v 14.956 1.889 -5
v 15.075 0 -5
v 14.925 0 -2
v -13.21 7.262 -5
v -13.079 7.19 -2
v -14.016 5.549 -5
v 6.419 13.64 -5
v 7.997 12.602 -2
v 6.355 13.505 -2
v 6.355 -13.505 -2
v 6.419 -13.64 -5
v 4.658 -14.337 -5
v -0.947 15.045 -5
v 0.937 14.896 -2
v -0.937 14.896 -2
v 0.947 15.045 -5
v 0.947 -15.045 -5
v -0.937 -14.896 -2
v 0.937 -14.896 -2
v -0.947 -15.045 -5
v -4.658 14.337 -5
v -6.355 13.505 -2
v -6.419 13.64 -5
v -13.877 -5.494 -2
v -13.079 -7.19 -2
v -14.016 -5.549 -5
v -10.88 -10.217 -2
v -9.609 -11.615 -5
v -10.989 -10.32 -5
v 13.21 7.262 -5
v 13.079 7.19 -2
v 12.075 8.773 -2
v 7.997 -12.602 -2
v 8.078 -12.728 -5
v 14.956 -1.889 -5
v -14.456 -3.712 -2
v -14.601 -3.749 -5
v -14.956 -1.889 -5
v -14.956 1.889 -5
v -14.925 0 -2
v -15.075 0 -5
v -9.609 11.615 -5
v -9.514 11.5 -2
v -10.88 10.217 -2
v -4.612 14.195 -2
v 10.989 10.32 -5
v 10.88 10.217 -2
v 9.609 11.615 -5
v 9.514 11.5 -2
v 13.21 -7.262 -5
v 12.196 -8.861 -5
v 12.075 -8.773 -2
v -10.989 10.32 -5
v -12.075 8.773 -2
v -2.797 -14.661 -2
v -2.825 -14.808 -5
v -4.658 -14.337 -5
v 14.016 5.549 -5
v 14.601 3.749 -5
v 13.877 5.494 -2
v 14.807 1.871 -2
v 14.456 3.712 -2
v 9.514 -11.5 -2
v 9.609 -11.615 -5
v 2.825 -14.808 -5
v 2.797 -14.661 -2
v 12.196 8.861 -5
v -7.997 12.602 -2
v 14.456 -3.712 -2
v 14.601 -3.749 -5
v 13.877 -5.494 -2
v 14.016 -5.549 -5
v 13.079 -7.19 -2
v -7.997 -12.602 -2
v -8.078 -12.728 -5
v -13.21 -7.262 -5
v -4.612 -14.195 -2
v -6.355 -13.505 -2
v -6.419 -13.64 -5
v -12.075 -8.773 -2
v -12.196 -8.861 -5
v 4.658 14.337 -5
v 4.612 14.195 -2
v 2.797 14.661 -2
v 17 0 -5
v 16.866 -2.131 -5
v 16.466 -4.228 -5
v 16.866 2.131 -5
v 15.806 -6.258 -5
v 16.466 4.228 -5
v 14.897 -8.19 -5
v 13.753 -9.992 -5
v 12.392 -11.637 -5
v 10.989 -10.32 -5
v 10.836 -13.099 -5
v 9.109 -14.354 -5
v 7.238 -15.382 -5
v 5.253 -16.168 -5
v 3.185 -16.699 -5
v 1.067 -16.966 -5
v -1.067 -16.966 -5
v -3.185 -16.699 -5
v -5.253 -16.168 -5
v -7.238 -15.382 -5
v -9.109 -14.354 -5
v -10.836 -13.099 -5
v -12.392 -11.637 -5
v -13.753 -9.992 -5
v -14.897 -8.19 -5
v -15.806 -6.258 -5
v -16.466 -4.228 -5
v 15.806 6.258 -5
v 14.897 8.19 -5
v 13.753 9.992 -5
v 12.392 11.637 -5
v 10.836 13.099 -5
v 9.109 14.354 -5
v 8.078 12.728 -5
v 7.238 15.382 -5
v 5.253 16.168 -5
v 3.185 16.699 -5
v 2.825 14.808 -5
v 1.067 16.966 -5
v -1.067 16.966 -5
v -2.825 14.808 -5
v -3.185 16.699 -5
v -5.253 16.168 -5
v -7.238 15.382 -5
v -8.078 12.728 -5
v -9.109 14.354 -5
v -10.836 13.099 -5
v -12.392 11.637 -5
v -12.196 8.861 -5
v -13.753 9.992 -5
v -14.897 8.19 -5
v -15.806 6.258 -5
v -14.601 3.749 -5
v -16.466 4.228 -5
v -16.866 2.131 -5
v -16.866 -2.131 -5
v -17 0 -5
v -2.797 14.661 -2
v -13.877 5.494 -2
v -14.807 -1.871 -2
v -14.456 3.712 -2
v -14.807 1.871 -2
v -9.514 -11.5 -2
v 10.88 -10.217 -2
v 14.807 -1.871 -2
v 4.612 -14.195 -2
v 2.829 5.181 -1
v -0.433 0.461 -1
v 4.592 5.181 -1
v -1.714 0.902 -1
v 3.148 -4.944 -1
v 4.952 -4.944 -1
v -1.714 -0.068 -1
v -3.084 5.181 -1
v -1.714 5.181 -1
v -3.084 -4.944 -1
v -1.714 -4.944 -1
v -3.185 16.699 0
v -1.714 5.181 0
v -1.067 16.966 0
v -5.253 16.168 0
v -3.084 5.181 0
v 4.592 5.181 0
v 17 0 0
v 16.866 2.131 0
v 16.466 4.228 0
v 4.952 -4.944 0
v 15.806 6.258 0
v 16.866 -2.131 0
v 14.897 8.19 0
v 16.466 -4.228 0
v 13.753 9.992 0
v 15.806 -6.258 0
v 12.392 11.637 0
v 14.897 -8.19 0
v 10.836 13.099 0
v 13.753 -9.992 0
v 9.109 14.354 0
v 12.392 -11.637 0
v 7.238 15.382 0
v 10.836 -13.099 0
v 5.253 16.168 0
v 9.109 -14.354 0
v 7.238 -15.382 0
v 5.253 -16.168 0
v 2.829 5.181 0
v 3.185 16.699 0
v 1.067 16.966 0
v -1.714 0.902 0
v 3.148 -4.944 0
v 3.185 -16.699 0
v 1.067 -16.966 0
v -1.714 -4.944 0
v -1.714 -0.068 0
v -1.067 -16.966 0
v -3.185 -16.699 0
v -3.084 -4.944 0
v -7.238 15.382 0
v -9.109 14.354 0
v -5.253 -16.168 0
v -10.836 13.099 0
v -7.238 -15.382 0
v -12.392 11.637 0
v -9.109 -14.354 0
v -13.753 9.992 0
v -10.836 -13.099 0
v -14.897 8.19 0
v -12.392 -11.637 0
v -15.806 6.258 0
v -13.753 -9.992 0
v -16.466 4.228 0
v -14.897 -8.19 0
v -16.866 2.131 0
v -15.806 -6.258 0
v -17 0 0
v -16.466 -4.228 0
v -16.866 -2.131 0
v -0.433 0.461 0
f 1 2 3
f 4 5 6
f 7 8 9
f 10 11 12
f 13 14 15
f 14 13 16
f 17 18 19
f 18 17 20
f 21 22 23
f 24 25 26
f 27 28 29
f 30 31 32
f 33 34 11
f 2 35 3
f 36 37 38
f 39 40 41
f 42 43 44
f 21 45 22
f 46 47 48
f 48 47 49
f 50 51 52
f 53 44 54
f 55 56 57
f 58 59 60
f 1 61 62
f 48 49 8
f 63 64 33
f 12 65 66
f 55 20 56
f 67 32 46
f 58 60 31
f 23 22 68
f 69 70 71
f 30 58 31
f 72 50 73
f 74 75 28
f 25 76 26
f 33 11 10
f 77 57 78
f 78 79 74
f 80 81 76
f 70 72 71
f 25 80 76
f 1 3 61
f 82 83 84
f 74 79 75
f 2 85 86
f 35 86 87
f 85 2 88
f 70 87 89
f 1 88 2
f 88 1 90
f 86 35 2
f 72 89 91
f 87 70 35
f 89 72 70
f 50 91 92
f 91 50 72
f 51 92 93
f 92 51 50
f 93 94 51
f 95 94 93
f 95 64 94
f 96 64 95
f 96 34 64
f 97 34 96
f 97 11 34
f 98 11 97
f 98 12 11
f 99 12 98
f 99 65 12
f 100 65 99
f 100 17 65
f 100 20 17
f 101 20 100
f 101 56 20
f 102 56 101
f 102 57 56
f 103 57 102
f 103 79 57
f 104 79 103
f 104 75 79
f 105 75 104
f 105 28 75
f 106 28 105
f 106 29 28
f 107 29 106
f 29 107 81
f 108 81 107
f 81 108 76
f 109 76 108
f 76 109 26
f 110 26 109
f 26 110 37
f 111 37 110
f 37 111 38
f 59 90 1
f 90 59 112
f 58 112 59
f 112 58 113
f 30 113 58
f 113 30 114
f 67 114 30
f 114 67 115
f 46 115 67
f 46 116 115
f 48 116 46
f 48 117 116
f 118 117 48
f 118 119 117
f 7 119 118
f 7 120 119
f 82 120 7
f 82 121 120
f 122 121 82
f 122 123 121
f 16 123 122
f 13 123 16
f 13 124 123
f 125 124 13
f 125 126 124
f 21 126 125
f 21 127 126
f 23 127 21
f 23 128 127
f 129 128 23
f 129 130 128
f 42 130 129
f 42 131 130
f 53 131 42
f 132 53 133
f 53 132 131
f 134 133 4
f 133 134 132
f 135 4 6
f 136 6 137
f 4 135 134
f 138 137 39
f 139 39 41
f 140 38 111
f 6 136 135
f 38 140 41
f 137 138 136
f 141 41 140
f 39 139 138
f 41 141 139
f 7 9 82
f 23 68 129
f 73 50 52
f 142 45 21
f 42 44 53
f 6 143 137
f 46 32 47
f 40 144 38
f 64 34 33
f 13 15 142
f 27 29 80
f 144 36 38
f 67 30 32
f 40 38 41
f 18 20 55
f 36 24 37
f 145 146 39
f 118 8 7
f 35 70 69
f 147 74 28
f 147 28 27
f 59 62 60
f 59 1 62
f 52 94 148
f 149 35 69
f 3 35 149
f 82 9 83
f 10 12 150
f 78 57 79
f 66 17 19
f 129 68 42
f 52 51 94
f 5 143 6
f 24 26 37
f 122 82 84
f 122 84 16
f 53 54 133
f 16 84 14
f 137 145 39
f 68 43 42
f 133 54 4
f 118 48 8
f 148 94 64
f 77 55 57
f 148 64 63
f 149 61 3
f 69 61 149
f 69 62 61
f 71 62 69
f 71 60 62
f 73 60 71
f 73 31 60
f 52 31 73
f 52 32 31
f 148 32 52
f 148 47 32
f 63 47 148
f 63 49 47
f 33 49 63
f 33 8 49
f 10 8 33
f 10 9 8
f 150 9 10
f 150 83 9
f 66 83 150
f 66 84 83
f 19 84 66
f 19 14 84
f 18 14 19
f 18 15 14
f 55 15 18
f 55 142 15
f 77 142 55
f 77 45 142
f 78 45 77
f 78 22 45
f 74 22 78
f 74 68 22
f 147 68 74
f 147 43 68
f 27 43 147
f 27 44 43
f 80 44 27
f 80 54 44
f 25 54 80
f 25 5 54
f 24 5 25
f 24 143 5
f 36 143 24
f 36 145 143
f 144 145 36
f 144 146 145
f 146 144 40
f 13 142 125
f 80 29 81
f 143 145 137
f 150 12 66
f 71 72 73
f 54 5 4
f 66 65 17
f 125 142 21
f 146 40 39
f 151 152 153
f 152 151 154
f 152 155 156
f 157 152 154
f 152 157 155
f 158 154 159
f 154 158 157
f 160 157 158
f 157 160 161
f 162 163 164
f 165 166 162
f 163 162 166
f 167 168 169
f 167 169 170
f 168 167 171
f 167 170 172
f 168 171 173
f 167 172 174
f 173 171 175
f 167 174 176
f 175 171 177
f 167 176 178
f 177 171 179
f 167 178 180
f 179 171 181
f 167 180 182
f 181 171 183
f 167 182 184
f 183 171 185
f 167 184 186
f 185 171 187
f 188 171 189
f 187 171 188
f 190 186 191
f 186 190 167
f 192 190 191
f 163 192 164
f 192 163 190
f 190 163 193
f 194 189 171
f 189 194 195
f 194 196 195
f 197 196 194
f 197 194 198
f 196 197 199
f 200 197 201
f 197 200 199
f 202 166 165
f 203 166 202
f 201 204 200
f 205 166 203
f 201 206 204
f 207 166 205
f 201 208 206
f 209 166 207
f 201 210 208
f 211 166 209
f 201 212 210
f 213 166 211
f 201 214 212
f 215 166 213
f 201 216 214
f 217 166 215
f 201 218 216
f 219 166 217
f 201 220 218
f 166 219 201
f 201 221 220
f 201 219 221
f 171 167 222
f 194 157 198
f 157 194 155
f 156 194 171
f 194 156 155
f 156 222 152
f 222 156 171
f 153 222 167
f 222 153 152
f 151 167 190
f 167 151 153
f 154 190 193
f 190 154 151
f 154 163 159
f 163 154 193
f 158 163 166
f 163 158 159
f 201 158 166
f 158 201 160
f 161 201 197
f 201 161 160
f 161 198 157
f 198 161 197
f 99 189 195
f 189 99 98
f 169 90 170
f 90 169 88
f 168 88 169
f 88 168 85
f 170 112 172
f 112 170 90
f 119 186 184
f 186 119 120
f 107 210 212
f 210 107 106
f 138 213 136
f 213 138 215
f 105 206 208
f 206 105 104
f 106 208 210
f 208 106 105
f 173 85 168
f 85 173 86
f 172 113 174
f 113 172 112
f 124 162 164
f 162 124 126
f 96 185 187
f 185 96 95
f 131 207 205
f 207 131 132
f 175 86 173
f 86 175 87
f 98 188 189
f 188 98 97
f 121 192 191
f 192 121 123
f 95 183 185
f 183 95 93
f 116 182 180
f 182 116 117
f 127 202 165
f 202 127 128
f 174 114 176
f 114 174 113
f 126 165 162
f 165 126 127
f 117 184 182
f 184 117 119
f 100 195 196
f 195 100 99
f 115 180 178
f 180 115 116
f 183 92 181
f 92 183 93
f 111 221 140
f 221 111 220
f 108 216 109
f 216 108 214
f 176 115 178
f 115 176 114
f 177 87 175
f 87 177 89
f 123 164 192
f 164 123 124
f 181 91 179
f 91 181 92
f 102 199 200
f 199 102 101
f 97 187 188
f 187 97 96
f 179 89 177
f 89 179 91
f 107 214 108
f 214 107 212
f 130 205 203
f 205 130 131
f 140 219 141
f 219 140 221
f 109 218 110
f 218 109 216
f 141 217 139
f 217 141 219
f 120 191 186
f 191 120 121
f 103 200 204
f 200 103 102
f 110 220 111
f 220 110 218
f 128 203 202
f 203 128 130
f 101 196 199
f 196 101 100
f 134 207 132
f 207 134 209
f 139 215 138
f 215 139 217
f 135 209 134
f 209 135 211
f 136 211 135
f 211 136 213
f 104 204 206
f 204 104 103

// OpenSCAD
$fn = 50;

difference() {
	union() {
		translate(v = [0, 0, -5.0]) {
			cylinder(h = 5, r = 17.0);
		}
	}
	union() {
		#translate(v = [0, 0, -5.0]) {
			cylinder(h = 3, r1 = 15.075, r2 = 14.925);
		}
		translate(v = [0, 0, -1]) {
			linear_extrude(height = 1) {
				text(font = "Impact", halign = "center", size = 10, text = "K", valign = "center");
			}
		}
	}
}
